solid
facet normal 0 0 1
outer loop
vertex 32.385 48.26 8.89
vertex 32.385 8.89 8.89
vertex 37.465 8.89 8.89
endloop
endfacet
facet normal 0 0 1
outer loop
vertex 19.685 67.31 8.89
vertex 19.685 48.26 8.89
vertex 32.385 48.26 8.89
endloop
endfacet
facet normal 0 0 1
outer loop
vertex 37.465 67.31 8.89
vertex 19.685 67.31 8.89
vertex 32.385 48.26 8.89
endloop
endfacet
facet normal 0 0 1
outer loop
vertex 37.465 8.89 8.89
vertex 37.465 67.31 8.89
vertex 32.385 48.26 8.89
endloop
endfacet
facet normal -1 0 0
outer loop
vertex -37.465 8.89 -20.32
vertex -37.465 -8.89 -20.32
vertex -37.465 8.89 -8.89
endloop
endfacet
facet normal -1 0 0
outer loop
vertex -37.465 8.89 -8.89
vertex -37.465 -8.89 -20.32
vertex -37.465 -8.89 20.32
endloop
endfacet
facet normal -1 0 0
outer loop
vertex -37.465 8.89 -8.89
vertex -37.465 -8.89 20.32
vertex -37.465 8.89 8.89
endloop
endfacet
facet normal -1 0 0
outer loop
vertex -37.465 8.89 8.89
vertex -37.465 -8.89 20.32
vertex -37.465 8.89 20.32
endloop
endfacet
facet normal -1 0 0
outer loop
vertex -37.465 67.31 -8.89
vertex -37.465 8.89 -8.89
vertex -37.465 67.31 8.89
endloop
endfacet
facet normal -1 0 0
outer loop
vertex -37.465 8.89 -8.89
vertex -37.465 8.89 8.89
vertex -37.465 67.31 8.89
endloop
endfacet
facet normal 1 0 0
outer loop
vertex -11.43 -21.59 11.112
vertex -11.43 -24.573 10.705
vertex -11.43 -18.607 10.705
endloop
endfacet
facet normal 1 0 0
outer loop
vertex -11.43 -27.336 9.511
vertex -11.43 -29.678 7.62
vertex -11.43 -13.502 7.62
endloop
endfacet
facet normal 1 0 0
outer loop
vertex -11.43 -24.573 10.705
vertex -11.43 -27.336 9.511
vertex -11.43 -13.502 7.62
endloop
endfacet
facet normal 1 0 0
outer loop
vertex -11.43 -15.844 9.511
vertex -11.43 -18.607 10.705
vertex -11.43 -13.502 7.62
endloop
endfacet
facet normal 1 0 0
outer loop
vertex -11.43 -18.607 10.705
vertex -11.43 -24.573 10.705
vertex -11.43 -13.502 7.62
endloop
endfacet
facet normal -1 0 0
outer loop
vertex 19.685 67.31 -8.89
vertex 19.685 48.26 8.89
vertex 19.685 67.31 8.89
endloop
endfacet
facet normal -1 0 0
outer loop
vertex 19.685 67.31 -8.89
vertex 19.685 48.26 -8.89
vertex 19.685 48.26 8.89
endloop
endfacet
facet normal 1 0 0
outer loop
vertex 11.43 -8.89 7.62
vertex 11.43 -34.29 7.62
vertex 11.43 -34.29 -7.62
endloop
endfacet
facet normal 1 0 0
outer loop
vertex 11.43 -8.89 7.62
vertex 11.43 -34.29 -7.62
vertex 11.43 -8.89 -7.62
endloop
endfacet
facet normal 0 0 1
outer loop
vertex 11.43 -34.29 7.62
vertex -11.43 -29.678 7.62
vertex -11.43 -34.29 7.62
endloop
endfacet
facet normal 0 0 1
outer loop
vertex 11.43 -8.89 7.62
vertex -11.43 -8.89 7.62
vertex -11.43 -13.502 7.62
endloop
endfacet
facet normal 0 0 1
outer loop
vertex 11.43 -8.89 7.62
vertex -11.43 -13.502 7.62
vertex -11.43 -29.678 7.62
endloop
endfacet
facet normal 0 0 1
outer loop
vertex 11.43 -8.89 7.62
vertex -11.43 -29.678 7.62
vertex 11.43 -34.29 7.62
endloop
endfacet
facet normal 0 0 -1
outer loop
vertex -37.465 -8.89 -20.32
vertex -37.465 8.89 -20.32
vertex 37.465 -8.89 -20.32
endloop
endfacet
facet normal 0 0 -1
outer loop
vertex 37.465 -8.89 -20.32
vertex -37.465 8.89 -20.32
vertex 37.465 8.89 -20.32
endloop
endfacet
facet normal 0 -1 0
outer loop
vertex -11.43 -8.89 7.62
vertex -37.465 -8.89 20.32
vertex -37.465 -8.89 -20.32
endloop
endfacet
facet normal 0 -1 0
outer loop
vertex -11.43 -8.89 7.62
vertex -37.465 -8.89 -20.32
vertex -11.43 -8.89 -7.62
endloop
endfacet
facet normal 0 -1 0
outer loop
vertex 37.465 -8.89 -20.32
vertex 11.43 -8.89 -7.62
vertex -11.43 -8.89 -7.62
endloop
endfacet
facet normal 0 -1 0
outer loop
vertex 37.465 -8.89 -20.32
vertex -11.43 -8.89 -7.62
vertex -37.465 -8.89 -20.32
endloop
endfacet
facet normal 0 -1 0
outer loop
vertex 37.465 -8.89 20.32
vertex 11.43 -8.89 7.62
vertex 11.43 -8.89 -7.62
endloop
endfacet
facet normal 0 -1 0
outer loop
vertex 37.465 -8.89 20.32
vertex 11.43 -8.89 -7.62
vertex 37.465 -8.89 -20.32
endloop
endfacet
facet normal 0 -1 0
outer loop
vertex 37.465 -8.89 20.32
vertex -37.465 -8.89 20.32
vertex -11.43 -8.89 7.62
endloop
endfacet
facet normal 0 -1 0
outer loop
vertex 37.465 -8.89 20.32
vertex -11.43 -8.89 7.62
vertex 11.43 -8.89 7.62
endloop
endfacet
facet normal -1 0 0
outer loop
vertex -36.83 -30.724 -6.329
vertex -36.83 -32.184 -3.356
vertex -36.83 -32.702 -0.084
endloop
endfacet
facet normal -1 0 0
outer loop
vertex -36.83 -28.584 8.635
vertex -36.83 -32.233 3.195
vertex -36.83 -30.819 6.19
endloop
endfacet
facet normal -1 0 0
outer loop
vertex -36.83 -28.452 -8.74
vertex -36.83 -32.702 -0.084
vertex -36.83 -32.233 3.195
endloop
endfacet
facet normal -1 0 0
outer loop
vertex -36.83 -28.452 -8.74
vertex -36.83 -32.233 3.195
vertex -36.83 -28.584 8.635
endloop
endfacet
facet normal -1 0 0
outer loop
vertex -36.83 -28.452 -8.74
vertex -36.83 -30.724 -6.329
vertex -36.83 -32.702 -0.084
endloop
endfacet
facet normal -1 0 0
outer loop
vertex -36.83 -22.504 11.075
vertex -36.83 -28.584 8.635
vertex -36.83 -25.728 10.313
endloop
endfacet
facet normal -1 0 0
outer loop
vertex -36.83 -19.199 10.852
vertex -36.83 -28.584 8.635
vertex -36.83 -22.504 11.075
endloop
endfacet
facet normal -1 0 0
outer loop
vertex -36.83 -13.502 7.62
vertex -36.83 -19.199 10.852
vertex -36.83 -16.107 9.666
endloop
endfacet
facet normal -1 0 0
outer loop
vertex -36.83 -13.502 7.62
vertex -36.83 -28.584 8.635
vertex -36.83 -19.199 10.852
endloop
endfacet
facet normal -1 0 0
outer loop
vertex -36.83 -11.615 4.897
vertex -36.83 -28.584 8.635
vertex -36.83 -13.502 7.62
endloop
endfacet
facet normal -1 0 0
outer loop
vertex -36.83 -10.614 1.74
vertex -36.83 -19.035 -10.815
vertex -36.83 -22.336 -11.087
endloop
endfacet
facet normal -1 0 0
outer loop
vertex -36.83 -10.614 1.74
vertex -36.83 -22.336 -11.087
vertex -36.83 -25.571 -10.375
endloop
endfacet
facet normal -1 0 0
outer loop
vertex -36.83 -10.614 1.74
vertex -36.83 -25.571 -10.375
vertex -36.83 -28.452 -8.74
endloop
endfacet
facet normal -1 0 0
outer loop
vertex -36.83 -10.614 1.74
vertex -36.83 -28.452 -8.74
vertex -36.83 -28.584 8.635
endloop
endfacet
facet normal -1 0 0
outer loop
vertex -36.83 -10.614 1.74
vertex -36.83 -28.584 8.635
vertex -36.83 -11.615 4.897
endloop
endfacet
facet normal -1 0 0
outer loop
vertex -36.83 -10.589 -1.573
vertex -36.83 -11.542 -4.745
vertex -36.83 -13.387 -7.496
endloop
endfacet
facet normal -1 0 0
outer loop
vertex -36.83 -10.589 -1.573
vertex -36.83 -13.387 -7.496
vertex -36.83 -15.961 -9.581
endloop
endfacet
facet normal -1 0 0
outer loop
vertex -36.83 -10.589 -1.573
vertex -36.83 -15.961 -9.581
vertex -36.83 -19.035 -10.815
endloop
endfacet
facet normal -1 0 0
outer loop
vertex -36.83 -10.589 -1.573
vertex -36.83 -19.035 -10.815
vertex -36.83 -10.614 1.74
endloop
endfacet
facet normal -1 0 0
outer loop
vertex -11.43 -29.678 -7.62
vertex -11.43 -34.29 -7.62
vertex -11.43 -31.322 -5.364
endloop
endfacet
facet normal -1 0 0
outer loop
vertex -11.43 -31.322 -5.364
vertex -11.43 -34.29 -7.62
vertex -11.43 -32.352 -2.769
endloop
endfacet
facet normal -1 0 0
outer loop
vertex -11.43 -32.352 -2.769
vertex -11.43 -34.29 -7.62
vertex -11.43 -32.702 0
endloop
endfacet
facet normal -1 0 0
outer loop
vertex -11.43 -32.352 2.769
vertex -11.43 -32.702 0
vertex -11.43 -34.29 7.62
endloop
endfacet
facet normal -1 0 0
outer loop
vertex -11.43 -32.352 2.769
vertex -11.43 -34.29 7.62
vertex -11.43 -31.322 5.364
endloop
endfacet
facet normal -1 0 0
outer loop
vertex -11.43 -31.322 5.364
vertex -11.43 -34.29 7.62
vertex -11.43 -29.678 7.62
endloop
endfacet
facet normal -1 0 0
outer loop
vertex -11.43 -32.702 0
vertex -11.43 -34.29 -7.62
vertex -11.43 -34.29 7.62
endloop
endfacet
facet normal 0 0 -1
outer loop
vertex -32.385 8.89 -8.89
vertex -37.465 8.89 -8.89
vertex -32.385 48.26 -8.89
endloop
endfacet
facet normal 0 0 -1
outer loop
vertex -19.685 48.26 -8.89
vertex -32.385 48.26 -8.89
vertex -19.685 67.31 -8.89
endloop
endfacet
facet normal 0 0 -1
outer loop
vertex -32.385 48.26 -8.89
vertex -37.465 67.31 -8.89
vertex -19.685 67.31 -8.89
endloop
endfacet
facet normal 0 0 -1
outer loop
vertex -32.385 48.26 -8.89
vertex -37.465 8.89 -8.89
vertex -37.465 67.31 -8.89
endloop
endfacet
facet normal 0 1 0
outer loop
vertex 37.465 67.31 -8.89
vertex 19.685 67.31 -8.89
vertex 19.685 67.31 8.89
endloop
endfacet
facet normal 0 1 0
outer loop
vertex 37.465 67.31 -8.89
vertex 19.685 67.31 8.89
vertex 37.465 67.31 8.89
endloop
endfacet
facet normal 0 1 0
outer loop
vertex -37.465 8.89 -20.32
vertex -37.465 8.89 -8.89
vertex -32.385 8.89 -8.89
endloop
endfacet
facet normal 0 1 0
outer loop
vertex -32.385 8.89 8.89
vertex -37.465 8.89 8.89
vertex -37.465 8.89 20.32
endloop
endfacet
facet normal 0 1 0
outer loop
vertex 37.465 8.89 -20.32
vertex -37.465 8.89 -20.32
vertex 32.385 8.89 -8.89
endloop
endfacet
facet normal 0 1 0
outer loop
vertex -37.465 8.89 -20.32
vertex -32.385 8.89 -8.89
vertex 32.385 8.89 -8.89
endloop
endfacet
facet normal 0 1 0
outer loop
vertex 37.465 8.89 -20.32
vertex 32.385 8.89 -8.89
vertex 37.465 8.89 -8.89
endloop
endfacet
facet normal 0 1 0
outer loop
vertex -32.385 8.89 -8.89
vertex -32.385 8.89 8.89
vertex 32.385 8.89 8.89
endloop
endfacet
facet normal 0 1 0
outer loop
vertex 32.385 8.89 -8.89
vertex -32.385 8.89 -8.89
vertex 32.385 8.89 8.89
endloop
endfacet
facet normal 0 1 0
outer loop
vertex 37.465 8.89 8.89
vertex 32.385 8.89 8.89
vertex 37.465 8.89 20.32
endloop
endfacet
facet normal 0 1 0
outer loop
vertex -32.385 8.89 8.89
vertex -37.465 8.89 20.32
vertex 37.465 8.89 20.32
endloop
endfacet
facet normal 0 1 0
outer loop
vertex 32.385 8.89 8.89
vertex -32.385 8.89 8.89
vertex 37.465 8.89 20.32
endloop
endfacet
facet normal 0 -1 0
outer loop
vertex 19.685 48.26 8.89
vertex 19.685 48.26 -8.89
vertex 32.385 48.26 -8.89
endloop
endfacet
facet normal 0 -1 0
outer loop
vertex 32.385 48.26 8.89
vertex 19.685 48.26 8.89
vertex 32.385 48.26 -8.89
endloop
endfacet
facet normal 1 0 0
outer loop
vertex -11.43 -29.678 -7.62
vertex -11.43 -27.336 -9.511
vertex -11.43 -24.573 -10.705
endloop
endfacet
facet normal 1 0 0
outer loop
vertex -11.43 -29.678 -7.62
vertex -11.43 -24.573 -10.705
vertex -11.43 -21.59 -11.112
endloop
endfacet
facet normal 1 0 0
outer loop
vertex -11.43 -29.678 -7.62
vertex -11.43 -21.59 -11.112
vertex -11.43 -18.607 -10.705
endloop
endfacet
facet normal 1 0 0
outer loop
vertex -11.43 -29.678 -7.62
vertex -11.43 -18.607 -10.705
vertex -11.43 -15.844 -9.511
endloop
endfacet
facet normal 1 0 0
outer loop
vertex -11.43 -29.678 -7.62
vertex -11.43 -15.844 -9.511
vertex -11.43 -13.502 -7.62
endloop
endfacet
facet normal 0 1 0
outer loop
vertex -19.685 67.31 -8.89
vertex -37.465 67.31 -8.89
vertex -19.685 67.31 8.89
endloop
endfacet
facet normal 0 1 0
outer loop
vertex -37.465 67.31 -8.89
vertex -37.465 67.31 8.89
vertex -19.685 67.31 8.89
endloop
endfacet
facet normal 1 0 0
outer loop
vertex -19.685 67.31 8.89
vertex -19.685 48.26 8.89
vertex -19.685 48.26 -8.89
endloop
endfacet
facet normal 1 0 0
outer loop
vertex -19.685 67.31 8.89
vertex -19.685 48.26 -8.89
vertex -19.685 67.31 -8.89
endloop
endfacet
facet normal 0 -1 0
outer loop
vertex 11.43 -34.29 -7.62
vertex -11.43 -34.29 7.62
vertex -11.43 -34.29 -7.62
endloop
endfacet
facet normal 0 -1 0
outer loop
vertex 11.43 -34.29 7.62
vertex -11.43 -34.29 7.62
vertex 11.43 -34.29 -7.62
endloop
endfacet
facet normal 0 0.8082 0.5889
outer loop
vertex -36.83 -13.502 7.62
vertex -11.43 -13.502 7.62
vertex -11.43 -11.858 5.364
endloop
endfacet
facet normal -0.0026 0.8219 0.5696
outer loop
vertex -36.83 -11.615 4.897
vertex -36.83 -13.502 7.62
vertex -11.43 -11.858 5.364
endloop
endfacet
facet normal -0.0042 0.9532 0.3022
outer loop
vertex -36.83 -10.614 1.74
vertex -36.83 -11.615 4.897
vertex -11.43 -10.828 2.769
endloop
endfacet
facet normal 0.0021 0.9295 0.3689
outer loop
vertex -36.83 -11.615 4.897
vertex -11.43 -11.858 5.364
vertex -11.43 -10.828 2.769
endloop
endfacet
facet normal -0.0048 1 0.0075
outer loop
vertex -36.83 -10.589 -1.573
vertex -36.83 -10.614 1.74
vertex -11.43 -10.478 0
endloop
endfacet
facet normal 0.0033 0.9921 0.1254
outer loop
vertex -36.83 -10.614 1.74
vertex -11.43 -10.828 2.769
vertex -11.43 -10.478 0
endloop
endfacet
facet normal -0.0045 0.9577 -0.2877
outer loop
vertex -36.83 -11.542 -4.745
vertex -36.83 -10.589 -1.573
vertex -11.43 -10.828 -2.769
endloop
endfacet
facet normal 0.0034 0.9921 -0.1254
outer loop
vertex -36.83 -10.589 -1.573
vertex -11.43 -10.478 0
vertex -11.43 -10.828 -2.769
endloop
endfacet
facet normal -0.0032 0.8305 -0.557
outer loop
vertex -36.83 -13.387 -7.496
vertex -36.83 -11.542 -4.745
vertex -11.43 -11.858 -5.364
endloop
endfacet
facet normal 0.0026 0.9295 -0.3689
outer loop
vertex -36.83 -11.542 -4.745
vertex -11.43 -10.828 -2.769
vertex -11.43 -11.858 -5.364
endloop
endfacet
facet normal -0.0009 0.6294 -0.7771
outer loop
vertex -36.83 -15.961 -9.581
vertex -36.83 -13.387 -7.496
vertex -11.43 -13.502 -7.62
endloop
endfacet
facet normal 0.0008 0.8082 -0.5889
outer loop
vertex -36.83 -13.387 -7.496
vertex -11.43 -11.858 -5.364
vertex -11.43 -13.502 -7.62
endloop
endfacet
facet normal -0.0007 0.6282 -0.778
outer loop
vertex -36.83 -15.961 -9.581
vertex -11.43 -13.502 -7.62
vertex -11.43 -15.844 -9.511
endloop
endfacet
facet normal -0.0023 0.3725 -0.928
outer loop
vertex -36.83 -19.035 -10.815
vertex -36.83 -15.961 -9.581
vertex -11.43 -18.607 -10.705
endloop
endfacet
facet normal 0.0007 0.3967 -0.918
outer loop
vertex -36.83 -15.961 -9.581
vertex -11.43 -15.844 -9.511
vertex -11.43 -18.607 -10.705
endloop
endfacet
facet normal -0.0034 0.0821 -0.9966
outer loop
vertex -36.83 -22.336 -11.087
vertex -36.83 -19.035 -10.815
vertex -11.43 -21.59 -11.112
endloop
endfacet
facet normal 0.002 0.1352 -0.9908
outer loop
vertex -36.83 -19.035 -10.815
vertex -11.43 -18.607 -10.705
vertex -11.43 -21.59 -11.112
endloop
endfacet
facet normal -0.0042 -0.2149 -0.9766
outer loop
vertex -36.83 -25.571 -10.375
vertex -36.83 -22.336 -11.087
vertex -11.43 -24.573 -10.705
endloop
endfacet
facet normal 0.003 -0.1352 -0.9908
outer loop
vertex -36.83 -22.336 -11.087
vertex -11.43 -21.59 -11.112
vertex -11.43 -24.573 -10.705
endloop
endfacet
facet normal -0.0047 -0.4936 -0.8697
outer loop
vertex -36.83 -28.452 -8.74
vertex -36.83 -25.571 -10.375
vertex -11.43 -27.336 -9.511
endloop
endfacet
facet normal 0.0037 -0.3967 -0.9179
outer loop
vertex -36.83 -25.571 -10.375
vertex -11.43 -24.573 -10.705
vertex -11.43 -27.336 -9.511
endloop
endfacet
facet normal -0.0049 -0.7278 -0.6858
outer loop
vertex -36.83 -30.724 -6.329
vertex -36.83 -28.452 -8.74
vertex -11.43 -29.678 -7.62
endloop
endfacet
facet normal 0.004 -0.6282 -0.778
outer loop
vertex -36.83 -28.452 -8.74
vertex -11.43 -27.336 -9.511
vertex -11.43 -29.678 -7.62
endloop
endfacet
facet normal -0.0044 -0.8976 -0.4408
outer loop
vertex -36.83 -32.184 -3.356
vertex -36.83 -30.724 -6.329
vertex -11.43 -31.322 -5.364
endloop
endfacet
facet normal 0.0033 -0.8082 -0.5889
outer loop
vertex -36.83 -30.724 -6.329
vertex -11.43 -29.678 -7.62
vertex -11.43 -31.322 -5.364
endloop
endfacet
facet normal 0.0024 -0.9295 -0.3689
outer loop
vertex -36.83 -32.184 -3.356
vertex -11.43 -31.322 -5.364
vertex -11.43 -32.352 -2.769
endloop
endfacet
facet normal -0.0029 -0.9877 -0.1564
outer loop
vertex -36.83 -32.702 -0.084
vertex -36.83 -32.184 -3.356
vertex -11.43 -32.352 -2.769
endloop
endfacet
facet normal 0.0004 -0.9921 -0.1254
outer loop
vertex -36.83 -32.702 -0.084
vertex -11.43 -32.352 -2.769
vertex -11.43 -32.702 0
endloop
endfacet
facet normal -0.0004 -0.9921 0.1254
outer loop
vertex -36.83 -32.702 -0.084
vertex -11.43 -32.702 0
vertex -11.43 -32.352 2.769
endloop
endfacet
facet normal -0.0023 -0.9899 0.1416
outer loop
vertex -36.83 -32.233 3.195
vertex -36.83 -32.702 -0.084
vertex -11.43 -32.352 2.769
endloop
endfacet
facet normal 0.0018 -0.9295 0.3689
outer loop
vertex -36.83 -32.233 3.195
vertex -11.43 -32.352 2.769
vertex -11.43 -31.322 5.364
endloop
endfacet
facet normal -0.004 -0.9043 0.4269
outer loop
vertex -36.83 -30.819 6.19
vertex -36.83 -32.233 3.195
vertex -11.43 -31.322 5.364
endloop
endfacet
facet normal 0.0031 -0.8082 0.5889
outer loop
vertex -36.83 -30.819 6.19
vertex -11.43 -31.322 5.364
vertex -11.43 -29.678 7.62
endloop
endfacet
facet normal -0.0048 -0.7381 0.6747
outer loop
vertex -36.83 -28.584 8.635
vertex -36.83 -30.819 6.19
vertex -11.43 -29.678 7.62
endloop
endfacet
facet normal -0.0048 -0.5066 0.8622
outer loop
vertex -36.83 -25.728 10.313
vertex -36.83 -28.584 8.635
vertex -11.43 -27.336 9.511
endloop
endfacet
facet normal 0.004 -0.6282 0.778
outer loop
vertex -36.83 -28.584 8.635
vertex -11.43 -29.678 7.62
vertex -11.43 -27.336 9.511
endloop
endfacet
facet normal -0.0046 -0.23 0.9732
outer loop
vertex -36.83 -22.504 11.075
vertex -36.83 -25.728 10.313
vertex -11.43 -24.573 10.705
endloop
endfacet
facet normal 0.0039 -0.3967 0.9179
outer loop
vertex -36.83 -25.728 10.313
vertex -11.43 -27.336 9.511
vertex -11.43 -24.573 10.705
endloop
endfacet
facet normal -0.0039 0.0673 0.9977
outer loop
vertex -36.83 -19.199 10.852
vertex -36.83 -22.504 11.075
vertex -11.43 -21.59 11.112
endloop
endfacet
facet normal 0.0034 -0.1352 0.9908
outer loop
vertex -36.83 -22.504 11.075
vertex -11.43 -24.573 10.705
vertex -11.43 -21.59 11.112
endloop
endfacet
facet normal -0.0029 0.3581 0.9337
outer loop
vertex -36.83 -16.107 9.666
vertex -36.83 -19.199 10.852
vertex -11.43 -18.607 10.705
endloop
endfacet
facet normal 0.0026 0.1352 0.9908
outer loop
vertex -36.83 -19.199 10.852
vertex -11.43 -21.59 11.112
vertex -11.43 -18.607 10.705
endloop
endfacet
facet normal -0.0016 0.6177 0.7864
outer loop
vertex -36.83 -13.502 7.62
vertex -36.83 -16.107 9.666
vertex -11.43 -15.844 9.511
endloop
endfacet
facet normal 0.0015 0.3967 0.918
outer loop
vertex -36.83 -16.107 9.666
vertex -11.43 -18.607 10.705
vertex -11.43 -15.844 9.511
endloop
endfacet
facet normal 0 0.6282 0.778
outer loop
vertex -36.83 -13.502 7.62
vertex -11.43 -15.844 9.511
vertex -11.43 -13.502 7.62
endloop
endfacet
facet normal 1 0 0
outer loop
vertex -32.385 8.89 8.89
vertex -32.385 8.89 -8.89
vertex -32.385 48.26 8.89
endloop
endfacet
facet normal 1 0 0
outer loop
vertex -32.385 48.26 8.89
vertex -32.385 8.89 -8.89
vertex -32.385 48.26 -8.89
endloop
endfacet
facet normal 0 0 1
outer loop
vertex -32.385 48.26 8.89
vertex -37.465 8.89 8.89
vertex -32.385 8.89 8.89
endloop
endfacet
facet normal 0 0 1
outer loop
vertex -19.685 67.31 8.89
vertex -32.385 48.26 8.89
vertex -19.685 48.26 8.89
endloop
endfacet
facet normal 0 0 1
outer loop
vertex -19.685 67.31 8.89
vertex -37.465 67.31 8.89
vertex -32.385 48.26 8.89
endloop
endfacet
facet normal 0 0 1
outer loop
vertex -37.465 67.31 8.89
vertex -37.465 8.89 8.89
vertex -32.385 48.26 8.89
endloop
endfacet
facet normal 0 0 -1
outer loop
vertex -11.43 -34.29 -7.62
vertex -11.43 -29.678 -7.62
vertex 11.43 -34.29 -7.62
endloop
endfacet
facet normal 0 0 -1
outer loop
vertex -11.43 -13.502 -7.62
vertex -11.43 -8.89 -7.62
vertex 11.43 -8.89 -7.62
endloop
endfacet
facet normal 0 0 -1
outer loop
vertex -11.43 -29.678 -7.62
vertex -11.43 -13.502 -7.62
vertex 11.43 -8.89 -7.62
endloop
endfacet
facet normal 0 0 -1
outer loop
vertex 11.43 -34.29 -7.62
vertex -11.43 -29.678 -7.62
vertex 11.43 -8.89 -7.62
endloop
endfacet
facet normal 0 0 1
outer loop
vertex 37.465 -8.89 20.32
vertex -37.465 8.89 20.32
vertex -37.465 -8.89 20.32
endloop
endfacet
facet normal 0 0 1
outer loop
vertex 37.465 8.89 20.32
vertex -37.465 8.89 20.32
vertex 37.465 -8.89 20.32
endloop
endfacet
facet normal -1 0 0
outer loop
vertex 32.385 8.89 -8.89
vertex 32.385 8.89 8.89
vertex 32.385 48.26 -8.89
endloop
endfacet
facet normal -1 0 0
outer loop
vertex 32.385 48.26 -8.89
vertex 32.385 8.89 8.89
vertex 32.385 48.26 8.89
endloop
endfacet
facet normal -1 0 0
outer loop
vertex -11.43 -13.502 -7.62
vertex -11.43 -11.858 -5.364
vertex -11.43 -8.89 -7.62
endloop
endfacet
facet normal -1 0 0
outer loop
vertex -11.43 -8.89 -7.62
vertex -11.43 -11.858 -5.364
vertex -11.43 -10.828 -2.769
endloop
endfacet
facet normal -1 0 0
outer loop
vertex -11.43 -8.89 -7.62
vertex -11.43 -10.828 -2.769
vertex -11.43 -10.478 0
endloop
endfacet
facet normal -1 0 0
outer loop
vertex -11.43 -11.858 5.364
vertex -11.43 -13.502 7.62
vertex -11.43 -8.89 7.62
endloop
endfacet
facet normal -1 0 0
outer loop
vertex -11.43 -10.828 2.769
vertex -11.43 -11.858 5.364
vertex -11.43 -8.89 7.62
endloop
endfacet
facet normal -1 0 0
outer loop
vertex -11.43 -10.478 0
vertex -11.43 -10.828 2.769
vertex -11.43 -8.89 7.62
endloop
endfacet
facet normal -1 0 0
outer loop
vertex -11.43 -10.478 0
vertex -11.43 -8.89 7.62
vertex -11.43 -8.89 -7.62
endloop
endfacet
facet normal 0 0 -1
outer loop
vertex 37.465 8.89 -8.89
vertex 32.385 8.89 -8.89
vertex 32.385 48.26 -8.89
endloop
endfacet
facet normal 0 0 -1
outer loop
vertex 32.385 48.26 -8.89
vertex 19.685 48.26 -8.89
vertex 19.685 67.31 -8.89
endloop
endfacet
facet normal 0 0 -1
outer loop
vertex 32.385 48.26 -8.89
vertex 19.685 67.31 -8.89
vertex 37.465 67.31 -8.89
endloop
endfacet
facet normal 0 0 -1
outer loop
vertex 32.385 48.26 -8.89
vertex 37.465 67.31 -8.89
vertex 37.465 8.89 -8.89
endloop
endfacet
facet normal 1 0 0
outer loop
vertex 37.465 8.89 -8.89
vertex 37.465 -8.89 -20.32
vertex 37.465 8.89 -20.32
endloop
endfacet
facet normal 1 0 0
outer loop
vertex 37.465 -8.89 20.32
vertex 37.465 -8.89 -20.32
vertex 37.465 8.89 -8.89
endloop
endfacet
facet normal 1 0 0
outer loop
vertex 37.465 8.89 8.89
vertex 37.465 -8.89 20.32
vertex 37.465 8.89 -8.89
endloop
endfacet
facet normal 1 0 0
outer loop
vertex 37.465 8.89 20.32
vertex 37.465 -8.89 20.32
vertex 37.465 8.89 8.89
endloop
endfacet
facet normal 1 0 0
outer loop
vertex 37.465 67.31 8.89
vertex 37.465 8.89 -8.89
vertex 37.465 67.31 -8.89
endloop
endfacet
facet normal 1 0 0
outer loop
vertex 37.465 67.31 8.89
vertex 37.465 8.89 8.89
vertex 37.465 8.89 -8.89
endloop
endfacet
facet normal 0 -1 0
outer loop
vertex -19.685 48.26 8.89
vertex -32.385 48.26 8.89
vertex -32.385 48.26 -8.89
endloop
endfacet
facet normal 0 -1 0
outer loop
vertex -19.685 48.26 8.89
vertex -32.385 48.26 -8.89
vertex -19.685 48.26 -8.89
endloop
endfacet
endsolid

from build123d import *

# Parameters (mm, degrees)
SKETCH1_W           = 74.93
SKETCH1_H           = 17.78
BOSS_EXTRUDE1_DEPTH = 20.32
SKETCH2_W           = 5.08
SKETCH2_H           = 39.37
BOSS_EXTRUDE2_DEPTH = 8.89
SKETCH3_W           = 17.78
SKETCH3_H           = 19.05
BOSS_EXTRUDE3_DEPTH = 8.89
SKETCH5_W           = 22.86
SKETCH5_H           = 25.4
BOSS_EXTRUDE4_DEPTH = 7.62
SKETCH6_R           = 11.1125
BOSS_EXTRUDE5_DEPTH = 25.4


with BuildPart() as part:
    # Sketch1 → Boss-Extrude1 (new, symmetric)
    with BuildSketch(Plane.XY):
        Rectangle(SKETCH1_W, SKETCH1_H)
    extrude(amount=BOSS_EXTRUDE1_DEPTH, both=True)

    # Sketch2 → Boss-Extrude2 (add, symmetric)
    with BuildSketch(Plane.XY):
        with Locations((-34.925, 28.575)):
            Rectangle(SKETCH2_W, SKETCH2_H)
        with Locations((34.925, 28.575)):
            Rectangle(SKETCH2_W, SKETCH2_H)
    extrude(amount=BOSS_EXTRUDE2_DEPTH, both=True)

    # Sketch3 → Boss-Extrude3 (add, symmetric)
    with BuildSketch(Plane.XY):
        with Locations((28.575, 57.785)):
            Rectangle(SKETCH3_W, SKETCH3_H)
        with Locations((-28.575, 57.785)):
            Rectangle(SKETCH3_W, SKETCH3_H)
    extrude(amount=BOSS_EXTRUDE3_DEPTH, both=True)

    # Sketch5 → Boss-Extrude4 (add, symmetric)
    with BuildSketch(Plane.XY):
        with Locations((0, -21.59)):
            Rectangle(SKETCH5_W, SKETCH5_H)
    extrude(amount=BOSS_EXTRUDE4_DEPTH, both=True)

    # Sketch6 → Boss-Extrude5 (add)
    with BuildSketch(Plane.ZY.offset(11.43)):
        with Locations(Location((0, -21.59, 0), (0, 0, 46.708192407))):
            Circle(SKETCH6_R)
    extrude(amount=BOSS_EXTRUDE5_DEPTH)


solid = part.part
